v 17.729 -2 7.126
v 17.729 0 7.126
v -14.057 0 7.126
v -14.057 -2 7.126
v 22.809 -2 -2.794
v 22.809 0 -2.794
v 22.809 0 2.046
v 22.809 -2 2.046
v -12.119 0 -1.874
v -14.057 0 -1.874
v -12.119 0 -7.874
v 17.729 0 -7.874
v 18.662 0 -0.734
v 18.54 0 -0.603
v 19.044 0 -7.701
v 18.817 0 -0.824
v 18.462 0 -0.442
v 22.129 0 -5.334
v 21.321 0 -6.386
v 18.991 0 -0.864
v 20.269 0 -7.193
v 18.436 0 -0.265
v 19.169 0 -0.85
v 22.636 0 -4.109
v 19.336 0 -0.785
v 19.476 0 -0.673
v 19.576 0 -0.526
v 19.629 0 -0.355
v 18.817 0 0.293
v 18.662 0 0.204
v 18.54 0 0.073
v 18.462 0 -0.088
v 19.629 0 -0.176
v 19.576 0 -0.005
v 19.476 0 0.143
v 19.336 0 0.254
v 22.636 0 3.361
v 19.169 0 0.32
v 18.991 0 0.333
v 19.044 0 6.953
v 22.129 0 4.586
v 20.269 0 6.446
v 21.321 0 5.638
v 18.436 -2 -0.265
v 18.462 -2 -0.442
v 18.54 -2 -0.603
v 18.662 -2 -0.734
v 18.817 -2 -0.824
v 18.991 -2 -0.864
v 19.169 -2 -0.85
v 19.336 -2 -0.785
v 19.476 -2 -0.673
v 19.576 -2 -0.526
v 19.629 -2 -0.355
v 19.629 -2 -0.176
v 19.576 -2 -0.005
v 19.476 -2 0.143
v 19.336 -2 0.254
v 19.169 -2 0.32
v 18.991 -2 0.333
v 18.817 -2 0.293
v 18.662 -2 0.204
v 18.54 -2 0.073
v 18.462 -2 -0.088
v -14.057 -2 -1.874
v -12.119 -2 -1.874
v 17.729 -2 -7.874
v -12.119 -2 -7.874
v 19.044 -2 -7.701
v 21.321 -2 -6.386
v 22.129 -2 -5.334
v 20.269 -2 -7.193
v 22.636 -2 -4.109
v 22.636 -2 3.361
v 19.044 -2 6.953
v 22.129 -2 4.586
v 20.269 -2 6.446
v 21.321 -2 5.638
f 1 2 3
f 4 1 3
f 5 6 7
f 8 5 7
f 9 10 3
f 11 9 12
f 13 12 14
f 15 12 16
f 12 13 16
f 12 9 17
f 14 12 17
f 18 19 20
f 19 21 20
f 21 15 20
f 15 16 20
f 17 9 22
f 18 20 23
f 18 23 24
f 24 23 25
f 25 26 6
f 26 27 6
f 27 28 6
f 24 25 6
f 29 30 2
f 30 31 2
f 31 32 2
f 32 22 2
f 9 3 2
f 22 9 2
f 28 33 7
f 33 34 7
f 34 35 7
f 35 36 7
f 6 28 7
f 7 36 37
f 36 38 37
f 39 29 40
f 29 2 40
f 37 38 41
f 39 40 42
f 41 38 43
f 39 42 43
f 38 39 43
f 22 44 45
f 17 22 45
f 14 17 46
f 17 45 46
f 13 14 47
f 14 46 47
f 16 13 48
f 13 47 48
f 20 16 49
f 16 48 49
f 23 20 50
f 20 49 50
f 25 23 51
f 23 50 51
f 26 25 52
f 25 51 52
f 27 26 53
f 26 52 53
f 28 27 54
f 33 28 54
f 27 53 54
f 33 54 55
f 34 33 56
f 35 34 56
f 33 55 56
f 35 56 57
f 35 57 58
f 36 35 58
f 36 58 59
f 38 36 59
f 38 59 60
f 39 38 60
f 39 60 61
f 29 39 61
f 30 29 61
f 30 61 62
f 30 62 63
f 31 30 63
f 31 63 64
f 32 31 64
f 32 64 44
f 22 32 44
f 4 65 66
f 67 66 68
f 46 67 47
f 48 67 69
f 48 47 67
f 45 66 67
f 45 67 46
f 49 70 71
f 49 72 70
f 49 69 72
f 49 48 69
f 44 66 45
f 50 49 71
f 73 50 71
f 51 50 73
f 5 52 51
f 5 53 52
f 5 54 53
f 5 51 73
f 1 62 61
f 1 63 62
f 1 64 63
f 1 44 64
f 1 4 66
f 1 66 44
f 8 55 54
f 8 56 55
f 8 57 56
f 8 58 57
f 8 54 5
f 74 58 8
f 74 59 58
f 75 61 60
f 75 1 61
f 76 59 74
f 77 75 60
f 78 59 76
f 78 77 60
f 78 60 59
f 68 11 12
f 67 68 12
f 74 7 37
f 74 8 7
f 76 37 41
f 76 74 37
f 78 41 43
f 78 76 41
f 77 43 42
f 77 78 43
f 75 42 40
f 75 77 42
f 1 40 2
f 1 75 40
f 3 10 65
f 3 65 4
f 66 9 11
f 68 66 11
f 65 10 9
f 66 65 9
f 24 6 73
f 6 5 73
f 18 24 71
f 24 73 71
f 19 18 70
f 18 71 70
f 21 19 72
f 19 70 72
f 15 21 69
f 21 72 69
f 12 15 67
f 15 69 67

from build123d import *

# Parameters (mm, degrees)
F0_W     = 7.8999367909
F0_H     = 15
F0_W_2   = 1.9381828606
F0_H_2   = 9
F1_DEPTH = 2
F2_R     = 5.08
F3_D     = 1.2
F3_DEPTH = 12.7
F3_TIP   = 0.3605163714


with BuildPart() as f1:
    # F0 (on Front) → F1 (new body)
    with BuildSketch(Plane.XZ):
        with Locations((18.8592814558, -0.3737040295)):
            Rectangle(F0_W, F0_H)
        Polygon((-12.1191004291, -7.8737040295), (14.9093130603, -7.8737040295), (14.9093130603, 7.1262959705), (-12.1191004291, 7.1262959705), (-12.1191004291, -1.8737040295), align=None)
        with Locations((-13.0881918594, 2.6262959705)):
            Rectangle(F0_W_2, F0_H_2)
    extrude(amount=F1_DEPTH)

    # F2
    f2_edges = [f1.edges().sort_by_distance(p)[0] for p in [
        (22.80925, -1, -7.873704),
        (22.80925, -1, 7.126296),
    ]]
    fillet(f2_edges, radius=F2_R)

    # F3
    with Locations(Plane(origin=(0, 0, 0), x_dir=(1, 0, 0), z_dir=(0, 1, 0))):
        with Locations((19.0357716603, 0.2653072295)):
            Hole(F3_D / 2, depth=F3_DEPTH)
            with Locations((0, 0, -(F3_DEPTH + F3_TIP / 2))):  # 118° drill point
                Cone(0, F3_D / 2, F3_TIP, mode=Mode.SUBTRACT)


solid = f1.part
